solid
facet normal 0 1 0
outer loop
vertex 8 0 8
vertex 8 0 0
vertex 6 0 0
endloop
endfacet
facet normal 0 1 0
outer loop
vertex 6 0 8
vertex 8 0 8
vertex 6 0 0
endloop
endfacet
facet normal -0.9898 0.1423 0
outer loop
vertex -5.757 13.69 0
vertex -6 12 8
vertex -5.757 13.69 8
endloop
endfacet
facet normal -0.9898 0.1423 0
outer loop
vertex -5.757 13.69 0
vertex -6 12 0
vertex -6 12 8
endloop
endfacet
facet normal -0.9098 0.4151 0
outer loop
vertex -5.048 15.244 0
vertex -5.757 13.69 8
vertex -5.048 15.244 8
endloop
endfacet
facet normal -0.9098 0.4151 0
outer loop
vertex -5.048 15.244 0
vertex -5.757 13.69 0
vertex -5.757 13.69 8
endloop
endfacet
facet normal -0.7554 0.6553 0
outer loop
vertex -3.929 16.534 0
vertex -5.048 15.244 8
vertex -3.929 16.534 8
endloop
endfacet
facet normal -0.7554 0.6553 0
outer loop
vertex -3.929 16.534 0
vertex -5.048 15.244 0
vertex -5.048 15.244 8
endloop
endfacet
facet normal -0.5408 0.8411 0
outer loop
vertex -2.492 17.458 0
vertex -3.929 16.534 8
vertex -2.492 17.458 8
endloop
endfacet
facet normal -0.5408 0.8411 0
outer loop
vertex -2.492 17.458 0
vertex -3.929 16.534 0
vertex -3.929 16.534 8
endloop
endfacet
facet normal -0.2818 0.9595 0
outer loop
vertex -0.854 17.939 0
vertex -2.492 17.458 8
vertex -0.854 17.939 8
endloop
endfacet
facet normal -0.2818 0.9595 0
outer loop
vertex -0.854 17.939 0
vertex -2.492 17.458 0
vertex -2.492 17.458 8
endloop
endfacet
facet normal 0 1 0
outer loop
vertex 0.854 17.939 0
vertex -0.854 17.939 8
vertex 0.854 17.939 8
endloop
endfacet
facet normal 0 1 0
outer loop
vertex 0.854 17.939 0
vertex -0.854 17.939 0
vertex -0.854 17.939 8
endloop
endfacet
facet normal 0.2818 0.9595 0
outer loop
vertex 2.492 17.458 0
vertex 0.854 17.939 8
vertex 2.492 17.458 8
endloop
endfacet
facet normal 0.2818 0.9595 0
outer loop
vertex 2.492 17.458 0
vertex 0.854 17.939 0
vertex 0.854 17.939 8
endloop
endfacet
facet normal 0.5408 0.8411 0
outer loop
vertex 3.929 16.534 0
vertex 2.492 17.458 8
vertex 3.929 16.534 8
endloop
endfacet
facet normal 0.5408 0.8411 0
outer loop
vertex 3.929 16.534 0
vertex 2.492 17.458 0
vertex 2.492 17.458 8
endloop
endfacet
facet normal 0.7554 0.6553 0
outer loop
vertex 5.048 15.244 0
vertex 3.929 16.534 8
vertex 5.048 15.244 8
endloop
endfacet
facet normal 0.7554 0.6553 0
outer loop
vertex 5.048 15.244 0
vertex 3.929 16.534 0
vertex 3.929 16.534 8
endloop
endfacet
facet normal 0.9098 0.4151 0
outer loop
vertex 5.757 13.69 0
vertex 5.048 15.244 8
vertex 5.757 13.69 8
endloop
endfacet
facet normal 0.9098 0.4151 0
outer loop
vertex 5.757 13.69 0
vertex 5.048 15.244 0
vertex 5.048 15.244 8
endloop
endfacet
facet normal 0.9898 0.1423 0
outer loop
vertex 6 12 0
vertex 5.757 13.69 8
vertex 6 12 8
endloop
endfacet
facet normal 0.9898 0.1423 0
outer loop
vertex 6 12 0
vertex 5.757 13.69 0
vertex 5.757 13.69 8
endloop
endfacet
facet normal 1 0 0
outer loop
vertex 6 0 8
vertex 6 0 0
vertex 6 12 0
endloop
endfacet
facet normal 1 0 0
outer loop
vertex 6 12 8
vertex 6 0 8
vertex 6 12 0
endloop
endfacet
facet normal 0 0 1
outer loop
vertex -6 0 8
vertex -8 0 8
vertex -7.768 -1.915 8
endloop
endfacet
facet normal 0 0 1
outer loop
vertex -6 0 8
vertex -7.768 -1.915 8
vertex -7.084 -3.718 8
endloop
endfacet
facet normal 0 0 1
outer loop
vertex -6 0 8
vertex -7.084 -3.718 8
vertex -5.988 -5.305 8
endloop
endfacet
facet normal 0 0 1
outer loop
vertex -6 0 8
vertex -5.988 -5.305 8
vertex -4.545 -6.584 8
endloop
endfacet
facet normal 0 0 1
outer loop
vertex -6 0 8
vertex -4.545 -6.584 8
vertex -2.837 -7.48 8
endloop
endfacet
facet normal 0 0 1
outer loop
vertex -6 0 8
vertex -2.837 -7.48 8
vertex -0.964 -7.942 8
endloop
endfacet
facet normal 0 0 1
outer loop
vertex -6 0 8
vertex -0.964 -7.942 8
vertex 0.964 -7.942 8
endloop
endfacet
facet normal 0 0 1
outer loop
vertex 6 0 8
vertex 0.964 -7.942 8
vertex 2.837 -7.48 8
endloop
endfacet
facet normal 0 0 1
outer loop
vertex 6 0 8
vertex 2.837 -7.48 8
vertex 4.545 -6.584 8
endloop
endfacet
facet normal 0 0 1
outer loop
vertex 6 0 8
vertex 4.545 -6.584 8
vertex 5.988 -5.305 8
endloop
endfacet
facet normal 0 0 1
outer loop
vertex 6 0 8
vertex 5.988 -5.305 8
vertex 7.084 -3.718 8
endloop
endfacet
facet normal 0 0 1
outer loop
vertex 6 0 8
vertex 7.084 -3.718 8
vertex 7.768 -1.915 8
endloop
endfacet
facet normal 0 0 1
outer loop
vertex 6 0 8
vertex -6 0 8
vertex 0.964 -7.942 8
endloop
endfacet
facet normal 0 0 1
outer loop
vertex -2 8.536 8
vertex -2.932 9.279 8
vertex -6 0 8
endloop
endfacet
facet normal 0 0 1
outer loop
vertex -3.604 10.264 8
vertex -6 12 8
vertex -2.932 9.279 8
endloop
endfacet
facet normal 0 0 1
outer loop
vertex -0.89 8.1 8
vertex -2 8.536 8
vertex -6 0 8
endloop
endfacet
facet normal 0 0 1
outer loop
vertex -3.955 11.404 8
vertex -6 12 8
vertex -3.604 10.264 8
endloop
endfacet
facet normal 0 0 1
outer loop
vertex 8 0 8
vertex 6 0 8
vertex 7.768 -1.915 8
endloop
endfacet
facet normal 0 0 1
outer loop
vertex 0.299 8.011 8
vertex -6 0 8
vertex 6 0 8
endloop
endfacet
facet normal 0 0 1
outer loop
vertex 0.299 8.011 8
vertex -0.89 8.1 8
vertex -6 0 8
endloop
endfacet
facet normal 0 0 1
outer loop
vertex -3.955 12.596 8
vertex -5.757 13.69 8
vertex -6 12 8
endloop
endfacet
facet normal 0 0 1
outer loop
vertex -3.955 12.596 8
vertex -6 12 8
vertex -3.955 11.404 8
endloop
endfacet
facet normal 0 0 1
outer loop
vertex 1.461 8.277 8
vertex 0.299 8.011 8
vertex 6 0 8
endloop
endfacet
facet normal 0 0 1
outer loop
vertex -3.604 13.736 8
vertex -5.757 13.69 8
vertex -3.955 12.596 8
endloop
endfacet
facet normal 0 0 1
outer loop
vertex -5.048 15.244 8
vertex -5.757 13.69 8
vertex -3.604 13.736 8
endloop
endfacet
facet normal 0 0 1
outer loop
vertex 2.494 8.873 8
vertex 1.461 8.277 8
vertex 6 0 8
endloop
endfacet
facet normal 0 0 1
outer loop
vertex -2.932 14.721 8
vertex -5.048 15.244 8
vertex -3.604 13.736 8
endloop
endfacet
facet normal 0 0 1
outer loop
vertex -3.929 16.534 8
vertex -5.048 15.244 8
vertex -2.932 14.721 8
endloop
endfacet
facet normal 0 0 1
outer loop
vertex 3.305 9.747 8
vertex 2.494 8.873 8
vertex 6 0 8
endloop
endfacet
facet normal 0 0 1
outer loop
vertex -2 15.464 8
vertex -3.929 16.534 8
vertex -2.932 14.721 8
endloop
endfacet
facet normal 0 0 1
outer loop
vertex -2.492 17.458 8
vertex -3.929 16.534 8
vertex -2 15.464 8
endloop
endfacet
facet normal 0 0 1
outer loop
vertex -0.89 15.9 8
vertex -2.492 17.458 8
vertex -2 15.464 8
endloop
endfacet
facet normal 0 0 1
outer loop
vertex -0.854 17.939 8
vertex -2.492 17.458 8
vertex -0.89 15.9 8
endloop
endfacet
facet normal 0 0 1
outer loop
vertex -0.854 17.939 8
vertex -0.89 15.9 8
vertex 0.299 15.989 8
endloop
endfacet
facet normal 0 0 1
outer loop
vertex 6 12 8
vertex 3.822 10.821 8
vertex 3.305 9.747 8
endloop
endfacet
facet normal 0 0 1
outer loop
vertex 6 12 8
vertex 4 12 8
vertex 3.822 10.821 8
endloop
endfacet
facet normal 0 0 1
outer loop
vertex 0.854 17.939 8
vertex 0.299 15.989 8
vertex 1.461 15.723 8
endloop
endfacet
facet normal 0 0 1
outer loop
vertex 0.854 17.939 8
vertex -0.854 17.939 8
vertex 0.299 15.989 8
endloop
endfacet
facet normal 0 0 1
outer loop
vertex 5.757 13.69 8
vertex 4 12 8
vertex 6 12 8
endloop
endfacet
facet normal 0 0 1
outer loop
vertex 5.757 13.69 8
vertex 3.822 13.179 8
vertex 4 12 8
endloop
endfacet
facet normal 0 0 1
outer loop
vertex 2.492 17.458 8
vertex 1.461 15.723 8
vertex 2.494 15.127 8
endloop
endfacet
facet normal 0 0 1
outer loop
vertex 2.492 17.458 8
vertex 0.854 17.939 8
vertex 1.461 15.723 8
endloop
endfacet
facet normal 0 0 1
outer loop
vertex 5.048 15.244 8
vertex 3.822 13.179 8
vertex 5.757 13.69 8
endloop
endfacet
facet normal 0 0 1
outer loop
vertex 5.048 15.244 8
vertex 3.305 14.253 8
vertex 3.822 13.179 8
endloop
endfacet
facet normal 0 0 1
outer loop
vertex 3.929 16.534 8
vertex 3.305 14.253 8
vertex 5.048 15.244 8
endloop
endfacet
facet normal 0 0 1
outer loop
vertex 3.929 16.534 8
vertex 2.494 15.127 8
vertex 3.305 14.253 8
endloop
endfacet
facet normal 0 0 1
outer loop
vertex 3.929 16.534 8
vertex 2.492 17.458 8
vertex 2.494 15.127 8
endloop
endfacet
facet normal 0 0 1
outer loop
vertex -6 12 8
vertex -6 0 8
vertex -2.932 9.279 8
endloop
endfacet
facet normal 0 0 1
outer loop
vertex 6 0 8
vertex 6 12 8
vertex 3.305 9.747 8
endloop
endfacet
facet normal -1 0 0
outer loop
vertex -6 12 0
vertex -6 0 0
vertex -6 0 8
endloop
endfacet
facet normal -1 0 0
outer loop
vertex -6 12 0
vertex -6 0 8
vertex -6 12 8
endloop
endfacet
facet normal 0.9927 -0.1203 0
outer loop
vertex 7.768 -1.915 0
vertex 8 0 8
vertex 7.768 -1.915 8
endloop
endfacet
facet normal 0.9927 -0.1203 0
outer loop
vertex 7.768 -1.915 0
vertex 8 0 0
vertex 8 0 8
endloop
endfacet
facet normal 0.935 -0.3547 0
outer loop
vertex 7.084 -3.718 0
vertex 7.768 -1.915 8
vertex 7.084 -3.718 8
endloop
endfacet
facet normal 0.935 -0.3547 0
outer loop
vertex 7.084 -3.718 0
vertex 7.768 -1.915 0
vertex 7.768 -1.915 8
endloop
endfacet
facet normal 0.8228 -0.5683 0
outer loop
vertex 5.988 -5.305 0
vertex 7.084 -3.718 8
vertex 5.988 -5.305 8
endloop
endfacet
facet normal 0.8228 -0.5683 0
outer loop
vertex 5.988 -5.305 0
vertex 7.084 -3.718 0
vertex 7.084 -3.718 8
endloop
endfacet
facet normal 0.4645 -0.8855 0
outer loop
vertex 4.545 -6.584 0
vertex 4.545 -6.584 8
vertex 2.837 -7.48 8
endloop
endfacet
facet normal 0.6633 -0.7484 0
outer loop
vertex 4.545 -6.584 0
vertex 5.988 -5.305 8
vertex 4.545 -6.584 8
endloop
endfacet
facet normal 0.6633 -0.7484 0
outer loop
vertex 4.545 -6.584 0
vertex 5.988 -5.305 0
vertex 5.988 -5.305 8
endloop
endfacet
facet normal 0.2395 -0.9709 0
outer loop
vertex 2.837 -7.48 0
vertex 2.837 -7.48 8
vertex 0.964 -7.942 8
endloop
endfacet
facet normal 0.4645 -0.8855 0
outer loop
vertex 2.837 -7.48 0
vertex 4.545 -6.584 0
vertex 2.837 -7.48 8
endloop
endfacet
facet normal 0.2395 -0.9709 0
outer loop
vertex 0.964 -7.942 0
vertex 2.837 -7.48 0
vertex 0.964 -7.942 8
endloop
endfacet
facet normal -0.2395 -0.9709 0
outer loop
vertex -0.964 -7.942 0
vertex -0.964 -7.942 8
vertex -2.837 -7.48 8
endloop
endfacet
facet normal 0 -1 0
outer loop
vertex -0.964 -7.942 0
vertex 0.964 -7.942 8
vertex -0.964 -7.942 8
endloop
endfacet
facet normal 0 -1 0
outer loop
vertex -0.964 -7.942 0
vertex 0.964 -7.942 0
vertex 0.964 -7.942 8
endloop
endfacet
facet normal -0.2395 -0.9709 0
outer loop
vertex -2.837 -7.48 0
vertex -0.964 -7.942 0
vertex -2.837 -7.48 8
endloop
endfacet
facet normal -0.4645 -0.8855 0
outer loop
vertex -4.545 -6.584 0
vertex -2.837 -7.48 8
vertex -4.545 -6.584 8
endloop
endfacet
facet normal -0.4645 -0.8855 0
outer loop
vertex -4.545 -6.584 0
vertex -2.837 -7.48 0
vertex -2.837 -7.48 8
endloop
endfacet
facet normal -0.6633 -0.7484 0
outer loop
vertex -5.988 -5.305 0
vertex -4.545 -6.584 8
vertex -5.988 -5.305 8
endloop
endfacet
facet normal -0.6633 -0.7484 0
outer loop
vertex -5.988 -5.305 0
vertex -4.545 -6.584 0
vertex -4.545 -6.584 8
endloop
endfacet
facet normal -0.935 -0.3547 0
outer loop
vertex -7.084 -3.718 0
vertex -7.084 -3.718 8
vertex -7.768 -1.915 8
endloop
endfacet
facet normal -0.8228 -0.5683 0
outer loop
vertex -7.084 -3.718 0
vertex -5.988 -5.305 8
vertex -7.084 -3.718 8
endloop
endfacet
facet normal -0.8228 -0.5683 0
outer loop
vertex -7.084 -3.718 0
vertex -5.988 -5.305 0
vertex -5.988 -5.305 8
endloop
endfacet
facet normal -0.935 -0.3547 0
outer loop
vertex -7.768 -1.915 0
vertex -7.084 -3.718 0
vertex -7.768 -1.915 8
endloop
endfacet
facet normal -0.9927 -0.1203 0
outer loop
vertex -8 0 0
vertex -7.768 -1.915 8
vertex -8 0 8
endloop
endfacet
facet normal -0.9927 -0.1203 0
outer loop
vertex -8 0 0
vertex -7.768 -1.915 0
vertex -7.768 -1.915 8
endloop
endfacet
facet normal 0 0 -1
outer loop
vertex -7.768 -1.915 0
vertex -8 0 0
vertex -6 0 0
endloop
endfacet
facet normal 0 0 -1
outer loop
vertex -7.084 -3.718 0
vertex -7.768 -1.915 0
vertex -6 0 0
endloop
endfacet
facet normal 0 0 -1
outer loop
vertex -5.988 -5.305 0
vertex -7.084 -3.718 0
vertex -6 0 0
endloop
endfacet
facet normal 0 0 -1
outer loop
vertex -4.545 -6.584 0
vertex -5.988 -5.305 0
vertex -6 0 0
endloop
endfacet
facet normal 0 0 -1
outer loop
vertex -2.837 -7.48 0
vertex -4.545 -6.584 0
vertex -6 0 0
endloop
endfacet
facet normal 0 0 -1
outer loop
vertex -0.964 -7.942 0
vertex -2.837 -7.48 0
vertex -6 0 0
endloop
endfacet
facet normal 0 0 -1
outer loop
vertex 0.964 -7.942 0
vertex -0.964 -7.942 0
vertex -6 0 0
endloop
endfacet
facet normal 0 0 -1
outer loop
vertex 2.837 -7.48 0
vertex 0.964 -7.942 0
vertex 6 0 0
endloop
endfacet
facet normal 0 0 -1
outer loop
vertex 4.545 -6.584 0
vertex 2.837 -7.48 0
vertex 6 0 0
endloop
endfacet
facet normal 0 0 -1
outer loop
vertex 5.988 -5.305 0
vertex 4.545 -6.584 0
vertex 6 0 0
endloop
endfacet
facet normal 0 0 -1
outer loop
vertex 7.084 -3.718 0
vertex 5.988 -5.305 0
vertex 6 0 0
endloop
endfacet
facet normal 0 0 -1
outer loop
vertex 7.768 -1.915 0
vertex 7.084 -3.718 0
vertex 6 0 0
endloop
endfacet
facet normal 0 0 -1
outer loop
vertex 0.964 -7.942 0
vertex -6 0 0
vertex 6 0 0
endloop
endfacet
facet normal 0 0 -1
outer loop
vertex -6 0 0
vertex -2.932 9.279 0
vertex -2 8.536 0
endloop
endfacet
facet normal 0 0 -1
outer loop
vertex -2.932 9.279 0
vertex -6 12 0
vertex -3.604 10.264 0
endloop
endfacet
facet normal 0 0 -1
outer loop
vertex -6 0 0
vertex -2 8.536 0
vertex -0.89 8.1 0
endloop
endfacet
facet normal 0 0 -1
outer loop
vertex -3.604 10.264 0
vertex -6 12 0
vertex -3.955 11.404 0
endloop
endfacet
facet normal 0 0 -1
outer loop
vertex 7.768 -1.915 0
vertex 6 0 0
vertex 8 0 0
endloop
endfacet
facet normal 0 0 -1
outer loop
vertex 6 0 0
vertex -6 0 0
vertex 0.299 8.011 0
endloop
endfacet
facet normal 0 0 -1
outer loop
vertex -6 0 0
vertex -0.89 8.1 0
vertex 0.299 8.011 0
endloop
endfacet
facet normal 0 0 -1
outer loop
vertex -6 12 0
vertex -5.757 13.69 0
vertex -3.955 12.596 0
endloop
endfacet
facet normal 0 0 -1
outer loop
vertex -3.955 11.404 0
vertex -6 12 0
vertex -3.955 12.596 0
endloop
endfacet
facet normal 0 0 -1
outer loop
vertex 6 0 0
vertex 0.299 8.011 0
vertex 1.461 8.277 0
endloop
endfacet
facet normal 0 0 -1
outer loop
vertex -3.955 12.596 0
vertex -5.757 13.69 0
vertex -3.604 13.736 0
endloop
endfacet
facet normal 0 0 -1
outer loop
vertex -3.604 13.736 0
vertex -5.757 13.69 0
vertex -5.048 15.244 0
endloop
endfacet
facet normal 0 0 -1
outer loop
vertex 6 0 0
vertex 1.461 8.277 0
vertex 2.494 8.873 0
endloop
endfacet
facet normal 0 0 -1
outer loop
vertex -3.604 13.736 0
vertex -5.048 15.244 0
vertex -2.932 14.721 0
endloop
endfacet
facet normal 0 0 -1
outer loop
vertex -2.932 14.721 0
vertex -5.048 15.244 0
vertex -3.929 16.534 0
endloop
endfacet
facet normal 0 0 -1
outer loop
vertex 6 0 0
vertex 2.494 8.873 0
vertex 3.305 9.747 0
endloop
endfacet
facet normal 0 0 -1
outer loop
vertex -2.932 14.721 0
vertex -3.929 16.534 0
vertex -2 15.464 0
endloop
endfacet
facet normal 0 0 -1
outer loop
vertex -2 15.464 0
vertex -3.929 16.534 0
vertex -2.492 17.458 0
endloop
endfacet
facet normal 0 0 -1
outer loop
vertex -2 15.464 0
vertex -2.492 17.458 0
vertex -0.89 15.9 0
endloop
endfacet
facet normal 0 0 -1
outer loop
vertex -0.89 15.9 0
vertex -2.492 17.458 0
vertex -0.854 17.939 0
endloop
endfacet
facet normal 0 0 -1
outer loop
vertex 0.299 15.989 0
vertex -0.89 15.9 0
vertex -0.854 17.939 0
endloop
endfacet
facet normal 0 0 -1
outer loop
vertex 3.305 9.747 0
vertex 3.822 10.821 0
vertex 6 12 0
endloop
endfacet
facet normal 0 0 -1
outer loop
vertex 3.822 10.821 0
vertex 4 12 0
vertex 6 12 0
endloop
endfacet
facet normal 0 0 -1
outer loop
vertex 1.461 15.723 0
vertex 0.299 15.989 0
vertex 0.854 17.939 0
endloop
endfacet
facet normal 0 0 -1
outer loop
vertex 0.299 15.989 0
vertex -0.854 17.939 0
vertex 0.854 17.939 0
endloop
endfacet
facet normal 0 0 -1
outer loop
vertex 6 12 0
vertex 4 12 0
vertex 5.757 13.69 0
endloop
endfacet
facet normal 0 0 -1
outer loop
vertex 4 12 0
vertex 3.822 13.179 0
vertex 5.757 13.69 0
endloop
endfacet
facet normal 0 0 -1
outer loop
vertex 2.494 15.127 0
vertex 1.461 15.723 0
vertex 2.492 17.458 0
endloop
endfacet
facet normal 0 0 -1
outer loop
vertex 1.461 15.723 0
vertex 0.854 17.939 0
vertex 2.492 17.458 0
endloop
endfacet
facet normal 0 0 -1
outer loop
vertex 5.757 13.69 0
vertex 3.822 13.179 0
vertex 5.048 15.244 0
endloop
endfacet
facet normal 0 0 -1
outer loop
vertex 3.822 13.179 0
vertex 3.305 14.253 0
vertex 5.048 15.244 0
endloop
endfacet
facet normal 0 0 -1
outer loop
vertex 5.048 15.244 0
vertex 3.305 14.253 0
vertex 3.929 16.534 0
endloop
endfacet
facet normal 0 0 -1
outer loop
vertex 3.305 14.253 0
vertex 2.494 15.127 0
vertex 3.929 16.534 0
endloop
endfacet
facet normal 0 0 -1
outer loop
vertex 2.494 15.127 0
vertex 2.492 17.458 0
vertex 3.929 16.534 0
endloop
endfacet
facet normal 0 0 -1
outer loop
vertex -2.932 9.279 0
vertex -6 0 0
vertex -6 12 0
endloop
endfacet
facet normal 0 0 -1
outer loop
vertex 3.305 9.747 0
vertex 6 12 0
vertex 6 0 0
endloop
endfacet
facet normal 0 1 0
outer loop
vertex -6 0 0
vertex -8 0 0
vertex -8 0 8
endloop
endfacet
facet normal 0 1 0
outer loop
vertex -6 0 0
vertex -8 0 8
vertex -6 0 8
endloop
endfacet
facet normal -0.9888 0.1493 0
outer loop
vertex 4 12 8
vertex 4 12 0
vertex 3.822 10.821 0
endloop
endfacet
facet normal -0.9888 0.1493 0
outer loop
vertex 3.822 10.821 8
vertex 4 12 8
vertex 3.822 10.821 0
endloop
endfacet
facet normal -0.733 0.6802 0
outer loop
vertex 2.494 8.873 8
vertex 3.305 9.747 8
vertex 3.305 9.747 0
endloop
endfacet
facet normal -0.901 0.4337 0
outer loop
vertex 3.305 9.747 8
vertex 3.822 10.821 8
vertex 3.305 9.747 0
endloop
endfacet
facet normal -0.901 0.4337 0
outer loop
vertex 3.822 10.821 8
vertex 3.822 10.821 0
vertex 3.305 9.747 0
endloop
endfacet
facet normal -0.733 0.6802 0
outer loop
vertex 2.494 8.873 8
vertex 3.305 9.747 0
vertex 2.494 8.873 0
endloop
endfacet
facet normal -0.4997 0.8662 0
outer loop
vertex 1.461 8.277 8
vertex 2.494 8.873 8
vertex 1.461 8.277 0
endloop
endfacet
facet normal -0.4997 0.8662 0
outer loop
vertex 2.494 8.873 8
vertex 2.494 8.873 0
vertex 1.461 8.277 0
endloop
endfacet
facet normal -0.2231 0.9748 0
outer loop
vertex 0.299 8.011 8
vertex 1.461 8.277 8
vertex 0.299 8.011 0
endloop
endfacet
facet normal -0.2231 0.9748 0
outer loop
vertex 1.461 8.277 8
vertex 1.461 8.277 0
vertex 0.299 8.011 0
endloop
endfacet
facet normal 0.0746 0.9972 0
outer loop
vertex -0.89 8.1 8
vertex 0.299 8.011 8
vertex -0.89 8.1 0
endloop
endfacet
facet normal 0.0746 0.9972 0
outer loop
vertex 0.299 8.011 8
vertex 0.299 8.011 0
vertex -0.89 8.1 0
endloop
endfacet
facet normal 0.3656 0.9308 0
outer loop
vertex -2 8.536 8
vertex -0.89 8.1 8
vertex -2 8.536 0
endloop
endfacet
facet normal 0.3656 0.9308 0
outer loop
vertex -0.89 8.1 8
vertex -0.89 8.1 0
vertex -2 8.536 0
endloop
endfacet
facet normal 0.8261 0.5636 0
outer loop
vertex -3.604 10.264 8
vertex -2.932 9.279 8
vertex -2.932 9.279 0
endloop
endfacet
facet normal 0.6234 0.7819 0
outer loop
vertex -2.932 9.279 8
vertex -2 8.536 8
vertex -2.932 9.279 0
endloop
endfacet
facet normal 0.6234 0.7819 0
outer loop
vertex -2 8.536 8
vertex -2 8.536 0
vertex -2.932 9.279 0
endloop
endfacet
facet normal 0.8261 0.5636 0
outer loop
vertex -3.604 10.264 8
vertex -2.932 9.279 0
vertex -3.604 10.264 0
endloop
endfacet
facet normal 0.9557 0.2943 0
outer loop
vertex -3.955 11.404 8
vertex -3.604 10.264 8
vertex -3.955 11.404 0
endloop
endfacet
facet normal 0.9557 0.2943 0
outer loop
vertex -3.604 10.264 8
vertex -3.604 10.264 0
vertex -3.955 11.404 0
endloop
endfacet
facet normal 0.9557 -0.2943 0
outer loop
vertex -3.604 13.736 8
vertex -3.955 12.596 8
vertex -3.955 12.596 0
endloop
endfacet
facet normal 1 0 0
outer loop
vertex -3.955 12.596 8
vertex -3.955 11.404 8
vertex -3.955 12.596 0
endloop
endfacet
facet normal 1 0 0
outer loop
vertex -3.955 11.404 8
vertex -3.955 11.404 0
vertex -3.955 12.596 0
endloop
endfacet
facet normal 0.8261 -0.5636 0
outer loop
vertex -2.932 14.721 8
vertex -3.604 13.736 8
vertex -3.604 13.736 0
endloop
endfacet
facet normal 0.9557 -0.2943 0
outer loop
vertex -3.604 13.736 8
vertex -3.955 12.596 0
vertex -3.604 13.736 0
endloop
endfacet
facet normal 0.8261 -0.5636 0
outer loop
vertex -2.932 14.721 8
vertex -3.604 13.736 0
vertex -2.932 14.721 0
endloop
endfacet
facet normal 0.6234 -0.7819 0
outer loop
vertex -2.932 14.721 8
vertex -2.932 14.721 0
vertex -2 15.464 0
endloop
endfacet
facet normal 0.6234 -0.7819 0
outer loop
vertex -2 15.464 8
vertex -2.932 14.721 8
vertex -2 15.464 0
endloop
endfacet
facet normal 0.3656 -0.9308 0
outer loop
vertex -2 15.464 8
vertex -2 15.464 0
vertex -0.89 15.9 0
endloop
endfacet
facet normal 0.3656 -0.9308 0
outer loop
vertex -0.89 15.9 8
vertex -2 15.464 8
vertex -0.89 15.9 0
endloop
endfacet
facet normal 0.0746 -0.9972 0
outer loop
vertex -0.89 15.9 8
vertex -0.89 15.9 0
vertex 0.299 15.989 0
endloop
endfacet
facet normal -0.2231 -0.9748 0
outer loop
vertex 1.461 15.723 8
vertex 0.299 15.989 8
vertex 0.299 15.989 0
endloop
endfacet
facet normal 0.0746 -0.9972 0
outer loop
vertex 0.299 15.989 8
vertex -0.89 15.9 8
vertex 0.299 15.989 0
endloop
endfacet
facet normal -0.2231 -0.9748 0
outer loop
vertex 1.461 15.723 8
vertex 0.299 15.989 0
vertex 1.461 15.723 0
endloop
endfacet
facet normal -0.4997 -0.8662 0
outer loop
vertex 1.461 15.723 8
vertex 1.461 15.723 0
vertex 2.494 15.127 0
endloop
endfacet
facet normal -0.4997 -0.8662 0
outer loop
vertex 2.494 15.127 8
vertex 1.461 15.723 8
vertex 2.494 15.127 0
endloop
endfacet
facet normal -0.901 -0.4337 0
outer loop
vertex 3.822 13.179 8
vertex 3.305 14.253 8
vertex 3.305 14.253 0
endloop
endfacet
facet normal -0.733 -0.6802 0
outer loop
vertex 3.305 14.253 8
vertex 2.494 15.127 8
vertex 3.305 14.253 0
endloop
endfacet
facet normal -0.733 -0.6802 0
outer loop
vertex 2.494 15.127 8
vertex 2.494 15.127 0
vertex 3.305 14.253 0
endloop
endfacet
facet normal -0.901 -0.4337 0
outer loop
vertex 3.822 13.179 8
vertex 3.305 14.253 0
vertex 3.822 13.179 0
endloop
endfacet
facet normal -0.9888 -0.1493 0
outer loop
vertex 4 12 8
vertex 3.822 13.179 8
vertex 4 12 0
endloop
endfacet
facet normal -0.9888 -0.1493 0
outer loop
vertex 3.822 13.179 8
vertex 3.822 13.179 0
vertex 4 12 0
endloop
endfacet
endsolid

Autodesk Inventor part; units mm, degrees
ref_plane "YZ Plane" through (0, 0, 0) normal (1, 0, 0) x (0, 1, 0)
ref_plane "XZ Plane" through (0, 0, 0) normal (0, 1, 0) x (-1, 0, 0)
ref_plane "XY Plane" through (0, 0, 0) normal (0, 0, 1) x (1, 0, 0)
sketch "Sketch1" plane through (0, 0, 0) normal (0, 0, 1) x (1, 0, 0)
  line L0 (-6, 0) -> (-6, 12)
  line L1 (-8, 0) -> (-6, 0)
  line L2 (8, 0) -> (6, 0)
  line L3 (6, 0) -> (6, 12)
  arc A0 (-8, 0) -> (8, 0) centre (0, 0) ccw
  arc A1 (6, 12) -> (-6, 12) centre (0, 12) ccw
  circle A2 centre (0, 12) radius 4
  point P0 (0, -8)
  dimension "d1" = 2
  dimension "d2" = 8
  dimension "d3" = 2
  dimension "d9" = 20
extrude "Extrusion1" add sketch "Sketch1" along normal blind 8
properties part number "khurramf_01_Swing"
